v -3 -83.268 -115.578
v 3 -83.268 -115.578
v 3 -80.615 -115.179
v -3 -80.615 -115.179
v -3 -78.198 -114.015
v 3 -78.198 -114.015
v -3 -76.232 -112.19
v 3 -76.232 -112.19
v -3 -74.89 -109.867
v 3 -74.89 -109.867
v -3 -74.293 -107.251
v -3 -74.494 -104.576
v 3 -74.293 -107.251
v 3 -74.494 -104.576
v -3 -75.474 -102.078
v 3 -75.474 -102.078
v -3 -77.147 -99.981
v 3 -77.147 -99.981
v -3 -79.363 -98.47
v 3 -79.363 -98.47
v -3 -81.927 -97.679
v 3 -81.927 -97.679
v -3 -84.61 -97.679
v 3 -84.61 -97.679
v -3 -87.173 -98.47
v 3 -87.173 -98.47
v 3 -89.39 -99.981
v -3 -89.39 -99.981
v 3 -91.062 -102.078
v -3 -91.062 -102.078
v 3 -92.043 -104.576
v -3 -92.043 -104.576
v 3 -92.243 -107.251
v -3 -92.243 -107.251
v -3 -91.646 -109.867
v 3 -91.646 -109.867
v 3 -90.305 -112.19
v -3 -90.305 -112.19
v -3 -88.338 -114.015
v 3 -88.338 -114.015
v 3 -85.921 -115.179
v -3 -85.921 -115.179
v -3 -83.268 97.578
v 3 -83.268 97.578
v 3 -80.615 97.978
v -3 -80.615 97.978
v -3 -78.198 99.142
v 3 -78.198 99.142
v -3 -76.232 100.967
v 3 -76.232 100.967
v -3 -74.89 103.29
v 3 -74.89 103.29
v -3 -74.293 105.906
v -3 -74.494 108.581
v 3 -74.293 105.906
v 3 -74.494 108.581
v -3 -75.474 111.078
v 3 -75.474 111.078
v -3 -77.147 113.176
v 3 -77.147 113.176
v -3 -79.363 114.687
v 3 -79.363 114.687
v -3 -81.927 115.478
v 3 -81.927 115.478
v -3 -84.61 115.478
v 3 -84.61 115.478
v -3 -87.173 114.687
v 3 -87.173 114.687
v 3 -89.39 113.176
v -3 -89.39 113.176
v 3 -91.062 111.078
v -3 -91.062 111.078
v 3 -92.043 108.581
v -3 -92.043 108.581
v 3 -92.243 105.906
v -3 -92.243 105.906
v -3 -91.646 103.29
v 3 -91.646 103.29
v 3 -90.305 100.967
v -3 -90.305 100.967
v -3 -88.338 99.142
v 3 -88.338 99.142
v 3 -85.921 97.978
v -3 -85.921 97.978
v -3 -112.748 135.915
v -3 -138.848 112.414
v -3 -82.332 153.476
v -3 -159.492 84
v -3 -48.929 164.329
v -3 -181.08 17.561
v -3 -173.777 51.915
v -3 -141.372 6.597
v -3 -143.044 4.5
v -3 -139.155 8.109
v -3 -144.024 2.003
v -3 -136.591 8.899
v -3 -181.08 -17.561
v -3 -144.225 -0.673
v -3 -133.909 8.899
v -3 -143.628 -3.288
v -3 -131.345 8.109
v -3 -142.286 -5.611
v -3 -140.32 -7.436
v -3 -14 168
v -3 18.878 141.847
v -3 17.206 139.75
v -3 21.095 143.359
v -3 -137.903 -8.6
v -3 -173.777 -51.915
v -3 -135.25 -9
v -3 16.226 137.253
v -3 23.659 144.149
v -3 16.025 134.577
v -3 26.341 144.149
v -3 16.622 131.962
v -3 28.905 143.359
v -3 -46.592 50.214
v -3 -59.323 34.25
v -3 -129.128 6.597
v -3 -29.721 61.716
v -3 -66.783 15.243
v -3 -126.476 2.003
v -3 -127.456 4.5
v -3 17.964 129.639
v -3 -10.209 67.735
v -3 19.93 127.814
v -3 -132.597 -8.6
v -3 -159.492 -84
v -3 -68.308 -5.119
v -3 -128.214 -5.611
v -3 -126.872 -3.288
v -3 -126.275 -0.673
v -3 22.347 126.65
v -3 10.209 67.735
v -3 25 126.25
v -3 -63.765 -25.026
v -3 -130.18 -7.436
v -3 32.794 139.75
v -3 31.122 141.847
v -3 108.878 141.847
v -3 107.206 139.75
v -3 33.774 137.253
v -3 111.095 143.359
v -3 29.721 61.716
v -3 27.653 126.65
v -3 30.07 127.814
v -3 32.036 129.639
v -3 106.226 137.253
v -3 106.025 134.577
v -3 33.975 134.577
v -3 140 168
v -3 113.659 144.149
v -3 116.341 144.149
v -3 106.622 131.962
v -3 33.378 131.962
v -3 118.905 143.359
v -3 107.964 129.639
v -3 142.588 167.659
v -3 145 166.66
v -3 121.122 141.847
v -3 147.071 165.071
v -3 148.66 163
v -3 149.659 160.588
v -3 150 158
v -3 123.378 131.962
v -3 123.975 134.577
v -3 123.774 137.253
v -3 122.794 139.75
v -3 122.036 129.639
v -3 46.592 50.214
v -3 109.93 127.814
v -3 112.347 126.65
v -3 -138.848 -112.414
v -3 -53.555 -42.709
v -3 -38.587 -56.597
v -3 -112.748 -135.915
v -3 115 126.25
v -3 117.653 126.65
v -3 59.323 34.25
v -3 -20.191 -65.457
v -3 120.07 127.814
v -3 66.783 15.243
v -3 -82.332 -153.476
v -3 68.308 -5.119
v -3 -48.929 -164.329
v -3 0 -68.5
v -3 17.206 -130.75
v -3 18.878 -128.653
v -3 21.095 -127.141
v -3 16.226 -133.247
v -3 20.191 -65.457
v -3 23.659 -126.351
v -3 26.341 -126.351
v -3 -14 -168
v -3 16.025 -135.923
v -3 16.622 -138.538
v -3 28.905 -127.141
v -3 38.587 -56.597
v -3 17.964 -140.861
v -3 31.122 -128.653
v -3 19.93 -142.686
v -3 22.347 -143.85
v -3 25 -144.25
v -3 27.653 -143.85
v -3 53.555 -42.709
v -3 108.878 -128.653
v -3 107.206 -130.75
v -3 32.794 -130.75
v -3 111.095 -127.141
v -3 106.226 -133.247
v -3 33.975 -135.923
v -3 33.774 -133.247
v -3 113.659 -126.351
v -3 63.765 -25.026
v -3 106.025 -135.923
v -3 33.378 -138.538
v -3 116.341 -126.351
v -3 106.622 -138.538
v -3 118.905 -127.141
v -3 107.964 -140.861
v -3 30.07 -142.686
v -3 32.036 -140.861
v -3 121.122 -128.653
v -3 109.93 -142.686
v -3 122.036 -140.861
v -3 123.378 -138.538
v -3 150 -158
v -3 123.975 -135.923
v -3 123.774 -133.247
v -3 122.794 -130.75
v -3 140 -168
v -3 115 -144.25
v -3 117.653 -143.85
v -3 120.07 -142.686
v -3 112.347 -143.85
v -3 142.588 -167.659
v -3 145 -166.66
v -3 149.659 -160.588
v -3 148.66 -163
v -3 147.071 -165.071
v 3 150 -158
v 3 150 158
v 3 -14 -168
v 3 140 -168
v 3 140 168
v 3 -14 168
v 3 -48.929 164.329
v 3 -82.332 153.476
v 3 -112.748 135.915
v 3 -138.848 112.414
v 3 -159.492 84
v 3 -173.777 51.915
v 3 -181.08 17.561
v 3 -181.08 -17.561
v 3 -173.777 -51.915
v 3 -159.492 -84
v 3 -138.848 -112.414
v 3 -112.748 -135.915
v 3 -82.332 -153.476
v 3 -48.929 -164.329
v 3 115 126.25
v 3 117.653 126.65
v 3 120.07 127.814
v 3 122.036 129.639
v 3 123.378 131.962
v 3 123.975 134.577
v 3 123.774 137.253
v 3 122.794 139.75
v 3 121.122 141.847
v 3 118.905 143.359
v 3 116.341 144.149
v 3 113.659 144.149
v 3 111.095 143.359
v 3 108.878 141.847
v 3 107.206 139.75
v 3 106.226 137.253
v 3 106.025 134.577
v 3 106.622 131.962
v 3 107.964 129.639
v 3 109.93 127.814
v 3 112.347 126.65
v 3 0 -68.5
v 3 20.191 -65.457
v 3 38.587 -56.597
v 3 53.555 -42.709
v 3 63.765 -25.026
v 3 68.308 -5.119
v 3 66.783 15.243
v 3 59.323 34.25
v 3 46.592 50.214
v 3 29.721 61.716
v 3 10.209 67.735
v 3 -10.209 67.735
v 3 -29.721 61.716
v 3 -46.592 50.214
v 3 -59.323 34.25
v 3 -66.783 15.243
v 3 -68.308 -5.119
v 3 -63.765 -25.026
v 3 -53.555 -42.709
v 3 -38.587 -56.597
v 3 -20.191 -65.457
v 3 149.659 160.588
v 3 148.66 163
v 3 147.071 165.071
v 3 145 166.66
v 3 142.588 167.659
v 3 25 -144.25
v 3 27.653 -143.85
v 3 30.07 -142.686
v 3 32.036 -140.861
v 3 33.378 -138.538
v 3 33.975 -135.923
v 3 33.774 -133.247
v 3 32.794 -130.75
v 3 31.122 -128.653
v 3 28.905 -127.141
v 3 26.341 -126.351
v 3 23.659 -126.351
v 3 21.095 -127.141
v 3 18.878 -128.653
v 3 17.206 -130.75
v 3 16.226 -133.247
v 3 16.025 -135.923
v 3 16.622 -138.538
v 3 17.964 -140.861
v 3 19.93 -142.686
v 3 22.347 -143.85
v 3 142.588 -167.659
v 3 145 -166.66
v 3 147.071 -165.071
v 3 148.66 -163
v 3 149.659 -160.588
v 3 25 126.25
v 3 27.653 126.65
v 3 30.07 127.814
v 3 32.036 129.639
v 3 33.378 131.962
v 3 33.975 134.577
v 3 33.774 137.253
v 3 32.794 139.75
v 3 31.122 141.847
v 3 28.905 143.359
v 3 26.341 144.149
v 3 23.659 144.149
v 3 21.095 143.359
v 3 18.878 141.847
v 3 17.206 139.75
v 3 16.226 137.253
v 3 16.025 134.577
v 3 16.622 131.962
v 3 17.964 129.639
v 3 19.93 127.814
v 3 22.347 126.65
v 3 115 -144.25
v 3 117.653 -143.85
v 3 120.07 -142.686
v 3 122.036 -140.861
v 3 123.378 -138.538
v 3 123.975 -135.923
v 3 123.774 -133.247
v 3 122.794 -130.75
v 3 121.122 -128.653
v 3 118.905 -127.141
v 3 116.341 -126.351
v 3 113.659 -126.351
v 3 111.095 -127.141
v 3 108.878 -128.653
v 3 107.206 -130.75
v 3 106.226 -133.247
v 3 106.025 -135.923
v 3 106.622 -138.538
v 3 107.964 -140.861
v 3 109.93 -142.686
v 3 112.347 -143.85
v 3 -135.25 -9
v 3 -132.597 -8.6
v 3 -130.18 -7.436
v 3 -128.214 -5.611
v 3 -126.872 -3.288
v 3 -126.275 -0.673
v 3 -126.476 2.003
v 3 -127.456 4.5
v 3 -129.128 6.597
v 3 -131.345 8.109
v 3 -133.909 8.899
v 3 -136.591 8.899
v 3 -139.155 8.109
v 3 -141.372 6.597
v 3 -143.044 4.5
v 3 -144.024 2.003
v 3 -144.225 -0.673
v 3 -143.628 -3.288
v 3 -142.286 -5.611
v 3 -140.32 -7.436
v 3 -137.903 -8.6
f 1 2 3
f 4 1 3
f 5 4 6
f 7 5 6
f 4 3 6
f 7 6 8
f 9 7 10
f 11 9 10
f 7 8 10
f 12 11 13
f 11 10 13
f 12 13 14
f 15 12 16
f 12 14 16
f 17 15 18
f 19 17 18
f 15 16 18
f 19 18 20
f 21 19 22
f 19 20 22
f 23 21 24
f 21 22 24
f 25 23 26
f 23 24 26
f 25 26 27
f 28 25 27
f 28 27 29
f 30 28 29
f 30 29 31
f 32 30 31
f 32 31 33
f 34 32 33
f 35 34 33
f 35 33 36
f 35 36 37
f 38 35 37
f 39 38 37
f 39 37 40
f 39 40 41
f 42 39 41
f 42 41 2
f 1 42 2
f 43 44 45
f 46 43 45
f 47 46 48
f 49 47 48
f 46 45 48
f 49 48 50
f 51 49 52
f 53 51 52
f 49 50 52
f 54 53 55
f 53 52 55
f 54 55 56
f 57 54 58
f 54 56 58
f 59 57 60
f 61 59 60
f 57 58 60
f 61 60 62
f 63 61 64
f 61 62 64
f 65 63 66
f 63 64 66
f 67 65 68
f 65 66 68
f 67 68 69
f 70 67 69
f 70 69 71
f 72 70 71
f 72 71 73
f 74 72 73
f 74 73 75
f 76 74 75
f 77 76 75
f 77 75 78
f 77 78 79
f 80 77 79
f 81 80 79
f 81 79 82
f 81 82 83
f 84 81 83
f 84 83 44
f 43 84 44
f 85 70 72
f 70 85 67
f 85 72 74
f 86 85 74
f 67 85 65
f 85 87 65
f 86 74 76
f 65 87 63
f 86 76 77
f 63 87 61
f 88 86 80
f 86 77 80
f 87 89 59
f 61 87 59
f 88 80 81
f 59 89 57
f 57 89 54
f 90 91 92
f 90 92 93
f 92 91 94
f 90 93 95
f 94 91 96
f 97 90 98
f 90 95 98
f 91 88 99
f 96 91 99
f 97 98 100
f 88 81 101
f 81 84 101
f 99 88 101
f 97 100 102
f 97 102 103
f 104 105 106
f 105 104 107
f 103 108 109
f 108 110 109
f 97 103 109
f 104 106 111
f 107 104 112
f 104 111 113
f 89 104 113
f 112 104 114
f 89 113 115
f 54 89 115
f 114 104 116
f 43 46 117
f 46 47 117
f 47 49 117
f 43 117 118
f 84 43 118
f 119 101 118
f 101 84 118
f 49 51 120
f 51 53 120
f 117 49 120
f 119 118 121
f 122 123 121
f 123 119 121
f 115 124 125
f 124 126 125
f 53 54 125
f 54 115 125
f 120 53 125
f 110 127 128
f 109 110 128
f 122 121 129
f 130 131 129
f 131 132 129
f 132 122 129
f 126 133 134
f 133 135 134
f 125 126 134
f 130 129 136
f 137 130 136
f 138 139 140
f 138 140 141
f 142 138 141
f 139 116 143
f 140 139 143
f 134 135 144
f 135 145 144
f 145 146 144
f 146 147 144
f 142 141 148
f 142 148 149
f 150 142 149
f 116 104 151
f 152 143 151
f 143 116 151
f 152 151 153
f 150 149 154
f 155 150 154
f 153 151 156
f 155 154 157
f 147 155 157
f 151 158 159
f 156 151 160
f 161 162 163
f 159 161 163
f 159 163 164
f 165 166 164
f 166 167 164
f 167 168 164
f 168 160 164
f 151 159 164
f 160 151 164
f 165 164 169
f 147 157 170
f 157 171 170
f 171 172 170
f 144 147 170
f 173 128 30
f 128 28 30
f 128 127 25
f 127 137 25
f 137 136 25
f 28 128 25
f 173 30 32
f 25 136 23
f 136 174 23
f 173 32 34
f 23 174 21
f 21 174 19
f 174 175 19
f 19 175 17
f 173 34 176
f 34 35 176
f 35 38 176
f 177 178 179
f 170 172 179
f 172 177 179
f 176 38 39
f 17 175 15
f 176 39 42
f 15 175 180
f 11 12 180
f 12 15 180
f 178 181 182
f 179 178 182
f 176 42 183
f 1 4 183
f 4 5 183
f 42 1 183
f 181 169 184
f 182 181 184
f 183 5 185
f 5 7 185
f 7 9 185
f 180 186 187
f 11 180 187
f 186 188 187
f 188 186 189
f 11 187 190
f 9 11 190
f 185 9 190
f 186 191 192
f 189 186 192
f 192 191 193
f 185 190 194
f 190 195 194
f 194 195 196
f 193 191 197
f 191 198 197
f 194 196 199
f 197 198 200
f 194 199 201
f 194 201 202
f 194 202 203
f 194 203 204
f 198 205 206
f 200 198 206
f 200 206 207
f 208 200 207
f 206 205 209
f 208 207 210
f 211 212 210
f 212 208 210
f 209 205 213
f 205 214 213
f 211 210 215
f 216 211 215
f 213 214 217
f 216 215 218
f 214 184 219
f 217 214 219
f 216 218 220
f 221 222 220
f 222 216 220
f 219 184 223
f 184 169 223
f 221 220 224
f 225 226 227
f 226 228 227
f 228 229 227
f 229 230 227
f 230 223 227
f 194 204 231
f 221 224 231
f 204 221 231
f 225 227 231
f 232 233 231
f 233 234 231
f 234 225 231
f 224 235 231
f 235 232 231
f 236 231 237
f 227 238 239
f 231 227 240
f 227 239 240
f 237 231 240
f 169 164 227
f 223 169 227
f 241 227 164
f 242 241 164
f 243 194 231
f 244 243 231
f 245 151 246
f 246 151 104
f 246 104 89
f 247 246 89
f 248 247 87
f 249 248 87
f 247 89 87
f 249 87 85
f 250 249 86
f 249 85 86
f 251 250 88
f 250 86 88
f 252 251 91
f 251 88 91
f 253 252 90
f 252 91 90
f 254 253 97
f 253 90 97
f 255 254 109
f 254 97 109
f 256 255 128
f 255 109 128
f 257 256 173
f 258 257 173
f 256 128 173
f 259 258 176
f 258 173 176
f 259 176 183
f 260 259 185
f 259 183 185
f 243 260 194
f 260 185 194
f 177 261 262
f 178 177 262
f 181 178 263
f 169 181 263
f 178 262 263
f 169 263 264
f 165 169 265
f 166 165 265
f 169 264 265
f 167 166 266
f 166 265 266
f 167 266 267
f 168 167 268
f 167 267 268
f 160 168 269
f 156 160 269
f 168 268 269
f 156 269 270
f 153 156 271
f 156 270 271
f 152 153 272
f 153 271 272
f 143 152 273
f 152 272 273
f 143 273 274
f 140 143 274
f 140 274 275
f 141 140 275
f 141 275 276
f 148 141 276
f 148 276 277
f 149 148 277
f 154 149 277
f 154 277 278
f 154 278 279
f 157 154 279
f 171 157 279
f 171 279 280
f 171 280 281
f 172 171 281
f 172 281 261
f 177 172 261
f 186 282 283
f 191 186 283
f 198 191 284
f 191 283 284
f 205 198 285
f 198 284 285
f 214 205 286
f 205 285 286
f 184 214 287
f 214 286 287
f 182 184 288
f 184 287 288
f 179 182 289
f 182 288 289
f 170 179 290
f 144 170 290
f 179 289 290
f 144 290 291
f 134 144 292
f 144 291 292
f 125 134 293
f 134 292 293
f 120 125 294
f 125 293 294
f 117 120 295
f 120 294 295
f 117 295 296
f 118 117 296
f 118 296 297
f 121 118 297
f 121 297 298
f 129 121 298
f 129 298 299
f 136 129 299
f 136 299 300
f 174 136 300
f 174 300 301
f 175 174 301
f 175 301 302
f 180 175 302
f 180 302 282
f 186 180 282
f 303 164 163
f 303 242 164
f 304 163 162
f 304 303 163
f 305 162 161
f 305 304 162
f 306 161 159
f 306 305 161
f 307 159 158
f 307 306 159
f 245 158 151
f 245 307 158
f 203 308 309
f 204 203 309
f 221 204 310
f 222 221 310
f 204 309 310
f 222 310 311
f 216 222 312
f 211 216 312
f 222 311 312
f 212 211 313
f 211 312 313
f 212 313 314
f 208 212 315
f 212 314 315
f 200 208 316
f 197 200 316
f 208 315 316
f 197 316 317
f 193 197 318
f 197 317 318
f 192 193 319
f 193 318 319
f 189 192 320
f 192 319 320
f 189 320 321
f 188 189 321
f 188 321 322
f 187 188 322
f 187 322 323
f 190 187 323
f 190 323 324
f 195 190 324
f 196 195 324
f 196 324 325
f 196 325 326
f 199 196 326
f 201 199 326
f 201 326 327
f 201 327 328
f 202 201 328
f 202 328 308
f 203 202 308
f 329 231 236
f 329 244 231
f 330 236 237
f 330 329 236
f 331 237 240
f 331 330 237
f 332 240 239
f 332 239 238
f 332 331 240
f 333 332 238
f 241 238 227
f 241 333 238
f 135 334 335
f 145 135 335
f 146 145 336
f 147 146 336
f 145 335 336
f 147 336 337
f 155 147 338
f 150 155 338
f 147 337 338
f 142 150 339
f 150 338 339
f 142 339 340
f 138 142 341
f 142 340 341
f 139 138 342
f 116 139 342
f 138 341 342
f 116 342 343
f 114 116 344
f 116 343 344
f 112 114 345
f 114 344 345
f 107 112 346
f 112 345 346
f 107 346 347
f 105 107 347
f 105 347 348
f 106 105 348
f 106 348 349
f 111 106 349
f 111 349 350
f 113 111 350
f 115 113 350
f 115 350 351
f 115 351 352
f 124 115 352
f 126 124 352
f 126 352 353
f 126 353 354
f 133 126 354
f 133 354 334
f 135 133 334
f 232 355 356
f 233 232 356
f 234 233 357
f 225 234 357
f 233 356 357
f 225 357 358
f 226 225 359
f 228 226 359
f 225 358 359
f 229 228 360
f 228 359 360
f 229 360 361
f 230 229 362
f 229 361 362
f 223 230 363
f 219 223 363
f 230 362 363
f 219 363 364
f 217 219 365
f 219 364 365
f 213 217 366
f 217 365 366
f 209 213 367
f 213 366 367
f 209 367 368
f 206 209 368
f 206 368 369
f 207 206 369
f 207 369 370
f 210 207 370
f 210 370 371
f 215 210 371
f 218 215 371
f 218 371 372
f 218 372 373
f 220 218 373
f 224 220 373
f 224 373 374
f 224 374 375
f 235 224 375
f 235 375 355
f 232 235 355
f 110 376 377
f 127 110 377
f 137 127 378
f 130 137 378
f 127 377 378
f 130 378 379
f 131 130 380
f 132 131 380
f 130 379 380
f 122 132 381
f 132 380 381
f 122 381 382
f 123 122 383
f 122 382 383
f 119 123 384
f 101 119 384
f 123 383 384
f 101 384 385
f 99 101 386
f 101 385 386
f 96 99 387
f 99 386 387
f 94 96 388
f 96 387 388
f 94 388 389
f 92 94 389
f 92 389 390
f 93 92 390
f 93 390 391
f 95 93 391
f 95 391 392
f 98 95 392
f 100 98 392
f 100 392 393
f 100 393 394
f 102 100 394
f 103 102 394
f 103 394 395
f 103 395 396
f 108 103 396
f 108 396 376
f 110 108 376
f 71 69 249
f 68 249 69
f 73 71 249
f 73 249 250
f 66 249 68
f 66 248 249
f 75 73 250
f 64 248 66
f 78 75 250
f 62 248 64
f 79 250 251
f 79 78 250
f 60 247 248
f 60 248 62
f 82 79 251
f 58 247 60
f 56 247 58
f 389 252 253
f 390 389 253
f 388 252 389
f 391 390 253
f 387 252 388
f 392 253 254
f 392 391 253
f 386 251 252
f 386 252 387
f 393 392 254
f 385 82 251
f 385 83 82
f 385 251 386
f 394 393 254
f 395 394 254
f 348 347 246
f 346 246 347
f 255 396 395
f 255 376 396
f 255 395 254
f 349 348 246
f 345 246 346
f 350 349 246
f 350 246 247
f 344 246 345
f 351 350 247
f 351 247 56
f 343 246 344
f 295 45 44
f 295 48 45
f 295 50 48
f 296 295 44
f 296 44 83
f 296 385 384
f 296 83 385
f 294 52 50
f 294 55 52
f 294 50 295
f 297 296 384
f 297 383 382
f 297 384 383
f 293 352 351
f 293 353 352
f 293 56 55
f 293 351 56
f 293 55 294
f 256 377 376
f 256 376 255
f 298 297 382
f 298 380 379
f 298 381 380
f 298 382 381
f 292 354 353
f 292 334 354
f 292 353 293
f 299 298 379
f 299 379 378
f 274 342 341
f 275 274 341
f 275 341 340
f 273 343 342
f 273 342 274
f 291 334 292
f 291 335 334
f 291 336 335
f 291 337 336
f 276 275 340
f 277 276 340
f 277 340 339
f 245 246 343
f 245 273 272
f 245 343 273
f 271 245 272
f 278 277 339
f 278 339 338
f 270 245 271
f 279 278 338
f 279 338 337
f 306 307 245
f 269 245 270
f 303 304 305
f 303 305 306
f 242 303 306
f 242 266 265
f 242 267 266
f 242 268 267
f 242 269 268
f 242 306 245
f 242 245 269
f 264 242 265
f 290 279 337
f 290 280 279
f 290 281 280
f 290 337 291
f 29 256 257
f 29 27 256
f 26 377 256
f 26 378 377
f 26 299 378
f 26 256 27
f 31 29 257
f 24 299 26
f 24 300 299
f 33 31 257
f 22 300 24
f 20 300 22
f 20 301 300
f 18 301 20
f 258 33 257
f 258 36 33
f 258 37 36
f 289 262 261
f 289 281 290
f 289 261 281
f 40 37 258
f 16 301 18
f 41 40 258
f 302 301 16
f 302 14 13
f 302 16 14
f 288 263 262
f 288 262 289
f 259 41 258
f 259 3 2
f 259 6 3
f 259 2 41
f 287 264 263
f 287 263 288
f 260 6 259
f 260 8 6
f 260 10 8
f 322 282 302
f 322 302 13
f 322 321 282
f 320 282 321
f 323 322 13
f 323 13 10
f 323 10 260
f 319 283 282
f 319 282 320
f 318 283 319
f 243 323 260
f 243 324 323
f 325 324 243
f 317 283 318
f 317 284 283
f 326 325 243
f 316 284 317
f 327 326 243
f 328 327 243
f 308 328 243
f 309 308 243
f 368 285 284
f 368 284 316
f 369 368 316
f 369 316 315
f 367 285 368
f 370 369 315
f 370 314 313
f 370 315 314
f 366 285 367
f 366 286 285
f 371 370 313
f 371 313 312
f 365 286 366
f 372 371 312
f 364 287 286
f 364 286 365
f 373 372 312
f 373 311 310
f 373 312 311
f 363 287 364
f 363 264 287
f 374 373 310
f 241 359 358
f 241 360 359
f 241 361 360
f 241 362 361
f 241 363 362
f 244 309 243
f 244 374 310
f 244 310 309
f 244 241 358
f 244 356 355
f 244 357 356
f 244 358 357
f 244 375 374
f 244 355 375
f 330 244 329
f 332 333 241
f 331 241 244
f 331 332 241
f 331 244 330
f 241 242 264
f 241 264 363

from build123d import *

# Parameters (mm, degrees)
SM_START               = -3
SM_BASE_FLANGE_1_DEPTH = 6
SKETCH_6_R             = 9
SKETCH_6_R_2           = 68.5
CUT_EXTRUDE_1_DEPTH    = 248.757946391
FILLET_1_R             = 10


# Read off the part's stored shape, not the designer's step: Базовая кромка1
with BuildPart() as part:
    # Базовая кромка1 outline → Базовая кромка1 (new body)
    with BuildSketch(Plane(origin=(0, 0, 0), x_dir=(0, 0, -1), z_dir=(1, 0, 0)).offset(SM_START)):
        with BuildLine():
            Line((168, -14), (168, 150))
            Line((168, 150), (-168, 150))
            Line((-168, 150), (-168, -14))
            ThreePointArc((-168, -14), (0, -182), (168, -14))
        make_face()
    extrude(amount=SM_BASE_FLANGE_1_DEPTH)

    # Эскиз6 → Вырез-Вытянуть1 (cut, through all)
    with BuildSketch(Plane(origin=(3, 0, 0), x_dir=(0, 0, -1), z_dir=(1, 0, 0))):
        with Locations((-135.25, 115)):
            Circle(SKETCH_6_R)
        with Locations((-106.578454425, -83.268214538)):
            Circle(SKETCH_6_R)
        with Locations((0, -135.25)):
            Circle(SKETCH_6_R)
        with Locations((106.578454425, -83.268214538)):
            Circle(SKETCH_6_R)
        with Locations((135.25, 115)):
            Circle(SKETCH_6_R)
        Circle(SKETCH_6_R_2)
        with Locations((-135.25, 25)):
            Circle(SKETCH_6_R)
        with Locations((135.25, 25)):
            Circle(SKETCH_6_R)
    extrude(amount=-CUT_EXTRUDE_1_DEPTH, mode=Mode.SUBTRACT)

    # Скругление1
    fillet_1_edges = [part.edges().sort_by_distance(p)[0] for p in [
        (0, 150, -168),
        (0, 150, 168),
    ]]
    fillet(fillet_1_edges, radius=FILLET_1_R)


solid = part.part
